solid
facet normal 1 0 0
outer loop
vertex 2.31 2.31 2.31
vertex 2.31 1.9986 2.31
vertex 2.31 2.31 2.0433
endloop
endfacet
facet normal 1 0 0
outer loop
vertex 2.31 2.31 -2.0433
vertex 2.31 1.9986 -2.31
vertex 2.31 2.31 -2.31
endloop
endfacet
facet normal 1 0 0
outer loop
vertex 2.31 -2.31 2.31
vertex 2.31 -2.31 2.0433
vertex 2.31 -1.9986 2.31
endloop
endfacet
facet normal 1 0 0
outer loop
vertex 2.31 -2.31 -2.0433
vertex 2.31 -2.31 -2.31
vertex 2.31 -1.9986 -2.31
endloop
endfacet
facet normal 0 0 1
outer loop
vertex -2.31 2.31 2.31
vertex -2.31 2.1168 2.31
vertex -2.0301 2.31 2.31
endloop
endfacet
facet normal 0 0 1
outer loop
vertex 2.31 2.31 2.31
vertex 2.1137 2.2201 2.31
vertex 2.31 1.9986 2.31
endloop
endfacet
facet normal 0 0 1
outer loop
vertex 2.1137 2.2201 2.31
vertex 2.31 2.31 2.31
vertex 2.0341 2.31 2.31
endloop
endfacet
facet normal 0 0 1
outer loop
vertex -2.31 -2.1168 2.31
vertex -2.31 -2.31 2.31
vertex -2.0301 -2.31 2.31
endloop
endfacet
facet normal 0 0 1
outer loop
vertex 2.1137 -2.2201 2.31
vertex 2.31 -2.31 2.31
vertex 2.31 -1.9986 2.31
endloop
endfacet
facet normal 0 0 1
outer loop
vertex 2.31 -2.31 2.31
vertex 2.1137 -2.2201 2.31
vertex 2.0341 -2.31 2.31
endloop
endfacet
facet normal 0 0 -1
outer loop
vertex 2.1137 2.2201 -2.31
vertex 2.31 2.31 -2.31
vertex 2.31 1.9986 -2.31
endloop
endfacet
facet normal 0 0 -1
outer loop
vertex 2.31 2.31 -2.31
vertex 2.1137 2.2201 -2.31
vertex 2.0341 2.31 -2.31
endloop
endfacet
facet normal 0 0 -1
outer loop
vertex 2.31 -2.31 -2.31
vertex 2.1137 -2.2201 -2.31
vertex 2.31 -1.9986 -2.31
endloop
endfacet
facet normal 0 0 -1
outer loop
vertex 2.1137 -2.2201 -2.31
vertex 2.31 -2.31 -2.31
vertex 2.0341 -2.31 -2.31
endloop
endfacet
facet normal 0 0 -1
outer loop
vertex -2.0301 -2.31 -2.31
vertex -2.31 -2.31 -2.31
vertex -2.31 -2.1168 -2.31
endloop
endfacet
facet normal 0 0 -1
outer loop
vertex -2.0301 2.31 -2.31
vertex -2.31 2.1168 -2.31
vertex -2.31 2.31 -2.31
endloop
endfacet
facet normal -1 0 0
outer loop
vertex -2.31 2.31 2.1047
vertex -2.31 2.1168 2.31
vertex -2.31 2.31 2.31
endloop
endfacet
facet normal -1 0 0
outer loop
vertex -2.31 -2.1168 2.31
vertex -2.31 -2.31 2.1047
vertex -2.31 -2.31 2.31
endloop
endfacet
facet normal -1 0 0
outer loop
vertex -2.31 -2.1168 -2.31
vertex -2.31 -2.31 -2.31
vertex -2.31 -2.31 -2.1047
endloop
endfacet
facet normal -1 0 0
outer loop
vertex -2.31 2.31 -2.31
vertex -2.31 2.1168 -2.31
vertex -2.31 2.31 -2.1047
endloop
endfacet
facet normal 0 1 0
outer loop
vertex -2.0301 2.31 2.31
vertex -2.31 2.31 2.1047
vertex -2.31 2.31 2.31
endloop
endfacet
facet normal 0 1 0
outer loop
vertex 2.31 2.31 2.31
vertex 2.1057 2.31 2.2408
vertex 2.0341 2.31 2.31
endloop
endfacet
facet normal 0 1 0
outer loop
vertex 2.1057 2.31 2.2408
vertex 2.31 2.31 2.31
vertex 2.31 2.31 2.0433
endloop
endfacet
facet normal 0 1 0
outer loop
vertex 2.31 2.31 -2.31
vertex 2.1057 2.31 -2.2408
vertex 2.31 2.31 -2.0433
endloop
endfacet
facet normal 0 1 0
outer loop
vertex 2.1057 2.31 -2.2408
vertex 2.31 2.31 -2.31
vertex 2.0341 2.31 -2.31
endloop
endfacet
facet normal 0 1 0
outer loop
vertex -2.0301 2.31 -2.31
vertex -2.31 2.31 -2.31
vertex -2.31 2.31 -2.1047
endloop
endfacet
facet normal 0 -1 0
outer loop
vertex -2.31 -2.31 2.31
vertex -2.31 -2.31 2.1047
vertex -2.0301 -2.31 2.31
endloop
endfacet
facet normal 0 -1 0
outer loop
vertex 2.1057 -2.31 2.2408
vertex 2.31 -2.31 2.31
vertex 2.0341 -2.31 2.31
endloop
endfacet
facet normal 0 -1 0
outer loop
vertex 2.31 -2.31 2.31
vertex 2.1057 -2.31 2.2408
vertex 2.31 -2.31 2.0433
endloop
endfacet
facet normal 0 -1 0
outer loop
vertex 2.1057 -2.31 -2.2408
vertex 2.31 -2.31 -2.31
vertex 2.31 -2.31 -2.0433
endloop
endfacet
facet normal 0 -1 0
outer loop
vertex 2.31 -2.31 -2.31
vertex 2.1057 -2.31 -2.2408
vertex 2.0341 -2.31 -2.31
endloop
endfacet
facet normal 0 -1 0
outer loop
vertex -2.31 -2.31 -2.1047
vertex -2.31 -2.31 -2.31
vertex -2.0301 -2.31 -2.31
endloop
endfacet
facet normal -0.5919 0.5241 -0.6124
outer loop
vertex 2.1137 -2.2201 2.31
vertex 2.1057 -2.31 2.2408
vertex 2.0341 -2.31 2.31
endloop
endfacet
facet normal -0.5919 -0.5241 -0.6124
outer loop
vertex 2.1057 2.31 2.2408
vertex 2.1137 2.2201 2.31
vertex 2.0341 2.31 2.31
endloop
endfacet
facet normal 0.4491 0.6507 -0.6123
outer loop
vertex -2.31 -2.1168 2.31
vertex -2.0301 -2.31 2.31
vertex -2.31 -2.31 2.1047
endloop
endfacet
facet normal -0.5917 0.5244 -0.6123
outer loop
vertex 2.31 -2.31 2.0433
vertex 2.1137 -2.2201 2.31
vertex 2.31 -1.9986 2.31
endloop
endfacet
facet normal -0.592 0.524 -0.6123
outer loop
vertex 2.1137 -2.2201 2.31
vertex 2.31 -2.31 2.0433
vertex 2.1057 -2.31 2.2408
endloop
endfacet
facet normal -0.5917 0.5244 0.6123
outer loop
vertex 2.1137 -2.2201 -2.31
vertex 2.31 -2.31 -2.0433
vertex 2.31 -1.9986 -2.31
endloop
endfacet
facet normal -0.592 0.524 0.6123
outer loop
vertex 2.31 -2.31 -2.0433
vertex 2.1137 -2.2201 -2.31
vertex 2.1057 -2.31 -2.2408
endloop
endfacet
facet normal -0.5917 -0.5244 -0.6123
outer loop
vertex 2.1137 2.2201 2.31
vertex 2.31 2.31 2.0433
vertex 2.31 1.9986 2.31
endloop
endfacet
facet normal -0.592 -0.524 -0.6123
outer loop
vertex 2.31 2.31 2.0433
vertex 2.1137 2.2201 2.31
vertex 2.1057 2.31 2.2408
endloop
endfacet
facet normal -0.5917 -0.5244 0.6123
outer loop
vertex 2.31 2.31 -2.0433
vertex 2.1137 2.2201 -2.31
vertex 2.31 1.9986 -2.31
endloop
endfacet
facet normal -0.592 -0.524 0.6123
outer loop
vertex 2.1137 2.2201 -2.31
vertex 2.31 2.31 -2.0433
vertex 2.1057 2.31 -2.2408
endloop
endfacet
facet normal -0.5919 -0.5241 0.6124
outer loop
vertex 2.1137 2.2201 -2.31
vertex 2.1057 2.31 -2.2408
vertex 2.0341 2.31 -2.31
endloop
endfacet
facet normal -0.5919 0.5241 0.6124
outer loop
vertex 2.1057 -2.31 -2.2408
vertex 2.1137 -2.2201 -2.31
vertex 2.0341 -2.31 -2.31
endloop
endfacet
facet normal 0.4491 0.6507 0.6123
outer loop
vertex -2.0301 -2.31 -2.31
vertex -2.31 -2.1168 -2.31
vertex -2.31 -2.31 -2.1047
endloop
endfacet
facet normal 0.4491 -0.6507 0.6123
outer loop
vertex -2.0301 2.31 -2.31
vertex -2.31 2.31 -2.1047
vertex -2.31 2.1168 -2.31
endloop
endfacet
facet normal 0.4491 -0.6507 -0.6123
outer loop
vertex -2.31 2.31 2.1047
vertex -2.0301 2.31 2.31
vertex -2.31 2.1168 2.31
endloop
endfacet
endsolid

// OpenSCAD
difference(){
    cube(4.62, center=true);
    sphere(d=8);
}
